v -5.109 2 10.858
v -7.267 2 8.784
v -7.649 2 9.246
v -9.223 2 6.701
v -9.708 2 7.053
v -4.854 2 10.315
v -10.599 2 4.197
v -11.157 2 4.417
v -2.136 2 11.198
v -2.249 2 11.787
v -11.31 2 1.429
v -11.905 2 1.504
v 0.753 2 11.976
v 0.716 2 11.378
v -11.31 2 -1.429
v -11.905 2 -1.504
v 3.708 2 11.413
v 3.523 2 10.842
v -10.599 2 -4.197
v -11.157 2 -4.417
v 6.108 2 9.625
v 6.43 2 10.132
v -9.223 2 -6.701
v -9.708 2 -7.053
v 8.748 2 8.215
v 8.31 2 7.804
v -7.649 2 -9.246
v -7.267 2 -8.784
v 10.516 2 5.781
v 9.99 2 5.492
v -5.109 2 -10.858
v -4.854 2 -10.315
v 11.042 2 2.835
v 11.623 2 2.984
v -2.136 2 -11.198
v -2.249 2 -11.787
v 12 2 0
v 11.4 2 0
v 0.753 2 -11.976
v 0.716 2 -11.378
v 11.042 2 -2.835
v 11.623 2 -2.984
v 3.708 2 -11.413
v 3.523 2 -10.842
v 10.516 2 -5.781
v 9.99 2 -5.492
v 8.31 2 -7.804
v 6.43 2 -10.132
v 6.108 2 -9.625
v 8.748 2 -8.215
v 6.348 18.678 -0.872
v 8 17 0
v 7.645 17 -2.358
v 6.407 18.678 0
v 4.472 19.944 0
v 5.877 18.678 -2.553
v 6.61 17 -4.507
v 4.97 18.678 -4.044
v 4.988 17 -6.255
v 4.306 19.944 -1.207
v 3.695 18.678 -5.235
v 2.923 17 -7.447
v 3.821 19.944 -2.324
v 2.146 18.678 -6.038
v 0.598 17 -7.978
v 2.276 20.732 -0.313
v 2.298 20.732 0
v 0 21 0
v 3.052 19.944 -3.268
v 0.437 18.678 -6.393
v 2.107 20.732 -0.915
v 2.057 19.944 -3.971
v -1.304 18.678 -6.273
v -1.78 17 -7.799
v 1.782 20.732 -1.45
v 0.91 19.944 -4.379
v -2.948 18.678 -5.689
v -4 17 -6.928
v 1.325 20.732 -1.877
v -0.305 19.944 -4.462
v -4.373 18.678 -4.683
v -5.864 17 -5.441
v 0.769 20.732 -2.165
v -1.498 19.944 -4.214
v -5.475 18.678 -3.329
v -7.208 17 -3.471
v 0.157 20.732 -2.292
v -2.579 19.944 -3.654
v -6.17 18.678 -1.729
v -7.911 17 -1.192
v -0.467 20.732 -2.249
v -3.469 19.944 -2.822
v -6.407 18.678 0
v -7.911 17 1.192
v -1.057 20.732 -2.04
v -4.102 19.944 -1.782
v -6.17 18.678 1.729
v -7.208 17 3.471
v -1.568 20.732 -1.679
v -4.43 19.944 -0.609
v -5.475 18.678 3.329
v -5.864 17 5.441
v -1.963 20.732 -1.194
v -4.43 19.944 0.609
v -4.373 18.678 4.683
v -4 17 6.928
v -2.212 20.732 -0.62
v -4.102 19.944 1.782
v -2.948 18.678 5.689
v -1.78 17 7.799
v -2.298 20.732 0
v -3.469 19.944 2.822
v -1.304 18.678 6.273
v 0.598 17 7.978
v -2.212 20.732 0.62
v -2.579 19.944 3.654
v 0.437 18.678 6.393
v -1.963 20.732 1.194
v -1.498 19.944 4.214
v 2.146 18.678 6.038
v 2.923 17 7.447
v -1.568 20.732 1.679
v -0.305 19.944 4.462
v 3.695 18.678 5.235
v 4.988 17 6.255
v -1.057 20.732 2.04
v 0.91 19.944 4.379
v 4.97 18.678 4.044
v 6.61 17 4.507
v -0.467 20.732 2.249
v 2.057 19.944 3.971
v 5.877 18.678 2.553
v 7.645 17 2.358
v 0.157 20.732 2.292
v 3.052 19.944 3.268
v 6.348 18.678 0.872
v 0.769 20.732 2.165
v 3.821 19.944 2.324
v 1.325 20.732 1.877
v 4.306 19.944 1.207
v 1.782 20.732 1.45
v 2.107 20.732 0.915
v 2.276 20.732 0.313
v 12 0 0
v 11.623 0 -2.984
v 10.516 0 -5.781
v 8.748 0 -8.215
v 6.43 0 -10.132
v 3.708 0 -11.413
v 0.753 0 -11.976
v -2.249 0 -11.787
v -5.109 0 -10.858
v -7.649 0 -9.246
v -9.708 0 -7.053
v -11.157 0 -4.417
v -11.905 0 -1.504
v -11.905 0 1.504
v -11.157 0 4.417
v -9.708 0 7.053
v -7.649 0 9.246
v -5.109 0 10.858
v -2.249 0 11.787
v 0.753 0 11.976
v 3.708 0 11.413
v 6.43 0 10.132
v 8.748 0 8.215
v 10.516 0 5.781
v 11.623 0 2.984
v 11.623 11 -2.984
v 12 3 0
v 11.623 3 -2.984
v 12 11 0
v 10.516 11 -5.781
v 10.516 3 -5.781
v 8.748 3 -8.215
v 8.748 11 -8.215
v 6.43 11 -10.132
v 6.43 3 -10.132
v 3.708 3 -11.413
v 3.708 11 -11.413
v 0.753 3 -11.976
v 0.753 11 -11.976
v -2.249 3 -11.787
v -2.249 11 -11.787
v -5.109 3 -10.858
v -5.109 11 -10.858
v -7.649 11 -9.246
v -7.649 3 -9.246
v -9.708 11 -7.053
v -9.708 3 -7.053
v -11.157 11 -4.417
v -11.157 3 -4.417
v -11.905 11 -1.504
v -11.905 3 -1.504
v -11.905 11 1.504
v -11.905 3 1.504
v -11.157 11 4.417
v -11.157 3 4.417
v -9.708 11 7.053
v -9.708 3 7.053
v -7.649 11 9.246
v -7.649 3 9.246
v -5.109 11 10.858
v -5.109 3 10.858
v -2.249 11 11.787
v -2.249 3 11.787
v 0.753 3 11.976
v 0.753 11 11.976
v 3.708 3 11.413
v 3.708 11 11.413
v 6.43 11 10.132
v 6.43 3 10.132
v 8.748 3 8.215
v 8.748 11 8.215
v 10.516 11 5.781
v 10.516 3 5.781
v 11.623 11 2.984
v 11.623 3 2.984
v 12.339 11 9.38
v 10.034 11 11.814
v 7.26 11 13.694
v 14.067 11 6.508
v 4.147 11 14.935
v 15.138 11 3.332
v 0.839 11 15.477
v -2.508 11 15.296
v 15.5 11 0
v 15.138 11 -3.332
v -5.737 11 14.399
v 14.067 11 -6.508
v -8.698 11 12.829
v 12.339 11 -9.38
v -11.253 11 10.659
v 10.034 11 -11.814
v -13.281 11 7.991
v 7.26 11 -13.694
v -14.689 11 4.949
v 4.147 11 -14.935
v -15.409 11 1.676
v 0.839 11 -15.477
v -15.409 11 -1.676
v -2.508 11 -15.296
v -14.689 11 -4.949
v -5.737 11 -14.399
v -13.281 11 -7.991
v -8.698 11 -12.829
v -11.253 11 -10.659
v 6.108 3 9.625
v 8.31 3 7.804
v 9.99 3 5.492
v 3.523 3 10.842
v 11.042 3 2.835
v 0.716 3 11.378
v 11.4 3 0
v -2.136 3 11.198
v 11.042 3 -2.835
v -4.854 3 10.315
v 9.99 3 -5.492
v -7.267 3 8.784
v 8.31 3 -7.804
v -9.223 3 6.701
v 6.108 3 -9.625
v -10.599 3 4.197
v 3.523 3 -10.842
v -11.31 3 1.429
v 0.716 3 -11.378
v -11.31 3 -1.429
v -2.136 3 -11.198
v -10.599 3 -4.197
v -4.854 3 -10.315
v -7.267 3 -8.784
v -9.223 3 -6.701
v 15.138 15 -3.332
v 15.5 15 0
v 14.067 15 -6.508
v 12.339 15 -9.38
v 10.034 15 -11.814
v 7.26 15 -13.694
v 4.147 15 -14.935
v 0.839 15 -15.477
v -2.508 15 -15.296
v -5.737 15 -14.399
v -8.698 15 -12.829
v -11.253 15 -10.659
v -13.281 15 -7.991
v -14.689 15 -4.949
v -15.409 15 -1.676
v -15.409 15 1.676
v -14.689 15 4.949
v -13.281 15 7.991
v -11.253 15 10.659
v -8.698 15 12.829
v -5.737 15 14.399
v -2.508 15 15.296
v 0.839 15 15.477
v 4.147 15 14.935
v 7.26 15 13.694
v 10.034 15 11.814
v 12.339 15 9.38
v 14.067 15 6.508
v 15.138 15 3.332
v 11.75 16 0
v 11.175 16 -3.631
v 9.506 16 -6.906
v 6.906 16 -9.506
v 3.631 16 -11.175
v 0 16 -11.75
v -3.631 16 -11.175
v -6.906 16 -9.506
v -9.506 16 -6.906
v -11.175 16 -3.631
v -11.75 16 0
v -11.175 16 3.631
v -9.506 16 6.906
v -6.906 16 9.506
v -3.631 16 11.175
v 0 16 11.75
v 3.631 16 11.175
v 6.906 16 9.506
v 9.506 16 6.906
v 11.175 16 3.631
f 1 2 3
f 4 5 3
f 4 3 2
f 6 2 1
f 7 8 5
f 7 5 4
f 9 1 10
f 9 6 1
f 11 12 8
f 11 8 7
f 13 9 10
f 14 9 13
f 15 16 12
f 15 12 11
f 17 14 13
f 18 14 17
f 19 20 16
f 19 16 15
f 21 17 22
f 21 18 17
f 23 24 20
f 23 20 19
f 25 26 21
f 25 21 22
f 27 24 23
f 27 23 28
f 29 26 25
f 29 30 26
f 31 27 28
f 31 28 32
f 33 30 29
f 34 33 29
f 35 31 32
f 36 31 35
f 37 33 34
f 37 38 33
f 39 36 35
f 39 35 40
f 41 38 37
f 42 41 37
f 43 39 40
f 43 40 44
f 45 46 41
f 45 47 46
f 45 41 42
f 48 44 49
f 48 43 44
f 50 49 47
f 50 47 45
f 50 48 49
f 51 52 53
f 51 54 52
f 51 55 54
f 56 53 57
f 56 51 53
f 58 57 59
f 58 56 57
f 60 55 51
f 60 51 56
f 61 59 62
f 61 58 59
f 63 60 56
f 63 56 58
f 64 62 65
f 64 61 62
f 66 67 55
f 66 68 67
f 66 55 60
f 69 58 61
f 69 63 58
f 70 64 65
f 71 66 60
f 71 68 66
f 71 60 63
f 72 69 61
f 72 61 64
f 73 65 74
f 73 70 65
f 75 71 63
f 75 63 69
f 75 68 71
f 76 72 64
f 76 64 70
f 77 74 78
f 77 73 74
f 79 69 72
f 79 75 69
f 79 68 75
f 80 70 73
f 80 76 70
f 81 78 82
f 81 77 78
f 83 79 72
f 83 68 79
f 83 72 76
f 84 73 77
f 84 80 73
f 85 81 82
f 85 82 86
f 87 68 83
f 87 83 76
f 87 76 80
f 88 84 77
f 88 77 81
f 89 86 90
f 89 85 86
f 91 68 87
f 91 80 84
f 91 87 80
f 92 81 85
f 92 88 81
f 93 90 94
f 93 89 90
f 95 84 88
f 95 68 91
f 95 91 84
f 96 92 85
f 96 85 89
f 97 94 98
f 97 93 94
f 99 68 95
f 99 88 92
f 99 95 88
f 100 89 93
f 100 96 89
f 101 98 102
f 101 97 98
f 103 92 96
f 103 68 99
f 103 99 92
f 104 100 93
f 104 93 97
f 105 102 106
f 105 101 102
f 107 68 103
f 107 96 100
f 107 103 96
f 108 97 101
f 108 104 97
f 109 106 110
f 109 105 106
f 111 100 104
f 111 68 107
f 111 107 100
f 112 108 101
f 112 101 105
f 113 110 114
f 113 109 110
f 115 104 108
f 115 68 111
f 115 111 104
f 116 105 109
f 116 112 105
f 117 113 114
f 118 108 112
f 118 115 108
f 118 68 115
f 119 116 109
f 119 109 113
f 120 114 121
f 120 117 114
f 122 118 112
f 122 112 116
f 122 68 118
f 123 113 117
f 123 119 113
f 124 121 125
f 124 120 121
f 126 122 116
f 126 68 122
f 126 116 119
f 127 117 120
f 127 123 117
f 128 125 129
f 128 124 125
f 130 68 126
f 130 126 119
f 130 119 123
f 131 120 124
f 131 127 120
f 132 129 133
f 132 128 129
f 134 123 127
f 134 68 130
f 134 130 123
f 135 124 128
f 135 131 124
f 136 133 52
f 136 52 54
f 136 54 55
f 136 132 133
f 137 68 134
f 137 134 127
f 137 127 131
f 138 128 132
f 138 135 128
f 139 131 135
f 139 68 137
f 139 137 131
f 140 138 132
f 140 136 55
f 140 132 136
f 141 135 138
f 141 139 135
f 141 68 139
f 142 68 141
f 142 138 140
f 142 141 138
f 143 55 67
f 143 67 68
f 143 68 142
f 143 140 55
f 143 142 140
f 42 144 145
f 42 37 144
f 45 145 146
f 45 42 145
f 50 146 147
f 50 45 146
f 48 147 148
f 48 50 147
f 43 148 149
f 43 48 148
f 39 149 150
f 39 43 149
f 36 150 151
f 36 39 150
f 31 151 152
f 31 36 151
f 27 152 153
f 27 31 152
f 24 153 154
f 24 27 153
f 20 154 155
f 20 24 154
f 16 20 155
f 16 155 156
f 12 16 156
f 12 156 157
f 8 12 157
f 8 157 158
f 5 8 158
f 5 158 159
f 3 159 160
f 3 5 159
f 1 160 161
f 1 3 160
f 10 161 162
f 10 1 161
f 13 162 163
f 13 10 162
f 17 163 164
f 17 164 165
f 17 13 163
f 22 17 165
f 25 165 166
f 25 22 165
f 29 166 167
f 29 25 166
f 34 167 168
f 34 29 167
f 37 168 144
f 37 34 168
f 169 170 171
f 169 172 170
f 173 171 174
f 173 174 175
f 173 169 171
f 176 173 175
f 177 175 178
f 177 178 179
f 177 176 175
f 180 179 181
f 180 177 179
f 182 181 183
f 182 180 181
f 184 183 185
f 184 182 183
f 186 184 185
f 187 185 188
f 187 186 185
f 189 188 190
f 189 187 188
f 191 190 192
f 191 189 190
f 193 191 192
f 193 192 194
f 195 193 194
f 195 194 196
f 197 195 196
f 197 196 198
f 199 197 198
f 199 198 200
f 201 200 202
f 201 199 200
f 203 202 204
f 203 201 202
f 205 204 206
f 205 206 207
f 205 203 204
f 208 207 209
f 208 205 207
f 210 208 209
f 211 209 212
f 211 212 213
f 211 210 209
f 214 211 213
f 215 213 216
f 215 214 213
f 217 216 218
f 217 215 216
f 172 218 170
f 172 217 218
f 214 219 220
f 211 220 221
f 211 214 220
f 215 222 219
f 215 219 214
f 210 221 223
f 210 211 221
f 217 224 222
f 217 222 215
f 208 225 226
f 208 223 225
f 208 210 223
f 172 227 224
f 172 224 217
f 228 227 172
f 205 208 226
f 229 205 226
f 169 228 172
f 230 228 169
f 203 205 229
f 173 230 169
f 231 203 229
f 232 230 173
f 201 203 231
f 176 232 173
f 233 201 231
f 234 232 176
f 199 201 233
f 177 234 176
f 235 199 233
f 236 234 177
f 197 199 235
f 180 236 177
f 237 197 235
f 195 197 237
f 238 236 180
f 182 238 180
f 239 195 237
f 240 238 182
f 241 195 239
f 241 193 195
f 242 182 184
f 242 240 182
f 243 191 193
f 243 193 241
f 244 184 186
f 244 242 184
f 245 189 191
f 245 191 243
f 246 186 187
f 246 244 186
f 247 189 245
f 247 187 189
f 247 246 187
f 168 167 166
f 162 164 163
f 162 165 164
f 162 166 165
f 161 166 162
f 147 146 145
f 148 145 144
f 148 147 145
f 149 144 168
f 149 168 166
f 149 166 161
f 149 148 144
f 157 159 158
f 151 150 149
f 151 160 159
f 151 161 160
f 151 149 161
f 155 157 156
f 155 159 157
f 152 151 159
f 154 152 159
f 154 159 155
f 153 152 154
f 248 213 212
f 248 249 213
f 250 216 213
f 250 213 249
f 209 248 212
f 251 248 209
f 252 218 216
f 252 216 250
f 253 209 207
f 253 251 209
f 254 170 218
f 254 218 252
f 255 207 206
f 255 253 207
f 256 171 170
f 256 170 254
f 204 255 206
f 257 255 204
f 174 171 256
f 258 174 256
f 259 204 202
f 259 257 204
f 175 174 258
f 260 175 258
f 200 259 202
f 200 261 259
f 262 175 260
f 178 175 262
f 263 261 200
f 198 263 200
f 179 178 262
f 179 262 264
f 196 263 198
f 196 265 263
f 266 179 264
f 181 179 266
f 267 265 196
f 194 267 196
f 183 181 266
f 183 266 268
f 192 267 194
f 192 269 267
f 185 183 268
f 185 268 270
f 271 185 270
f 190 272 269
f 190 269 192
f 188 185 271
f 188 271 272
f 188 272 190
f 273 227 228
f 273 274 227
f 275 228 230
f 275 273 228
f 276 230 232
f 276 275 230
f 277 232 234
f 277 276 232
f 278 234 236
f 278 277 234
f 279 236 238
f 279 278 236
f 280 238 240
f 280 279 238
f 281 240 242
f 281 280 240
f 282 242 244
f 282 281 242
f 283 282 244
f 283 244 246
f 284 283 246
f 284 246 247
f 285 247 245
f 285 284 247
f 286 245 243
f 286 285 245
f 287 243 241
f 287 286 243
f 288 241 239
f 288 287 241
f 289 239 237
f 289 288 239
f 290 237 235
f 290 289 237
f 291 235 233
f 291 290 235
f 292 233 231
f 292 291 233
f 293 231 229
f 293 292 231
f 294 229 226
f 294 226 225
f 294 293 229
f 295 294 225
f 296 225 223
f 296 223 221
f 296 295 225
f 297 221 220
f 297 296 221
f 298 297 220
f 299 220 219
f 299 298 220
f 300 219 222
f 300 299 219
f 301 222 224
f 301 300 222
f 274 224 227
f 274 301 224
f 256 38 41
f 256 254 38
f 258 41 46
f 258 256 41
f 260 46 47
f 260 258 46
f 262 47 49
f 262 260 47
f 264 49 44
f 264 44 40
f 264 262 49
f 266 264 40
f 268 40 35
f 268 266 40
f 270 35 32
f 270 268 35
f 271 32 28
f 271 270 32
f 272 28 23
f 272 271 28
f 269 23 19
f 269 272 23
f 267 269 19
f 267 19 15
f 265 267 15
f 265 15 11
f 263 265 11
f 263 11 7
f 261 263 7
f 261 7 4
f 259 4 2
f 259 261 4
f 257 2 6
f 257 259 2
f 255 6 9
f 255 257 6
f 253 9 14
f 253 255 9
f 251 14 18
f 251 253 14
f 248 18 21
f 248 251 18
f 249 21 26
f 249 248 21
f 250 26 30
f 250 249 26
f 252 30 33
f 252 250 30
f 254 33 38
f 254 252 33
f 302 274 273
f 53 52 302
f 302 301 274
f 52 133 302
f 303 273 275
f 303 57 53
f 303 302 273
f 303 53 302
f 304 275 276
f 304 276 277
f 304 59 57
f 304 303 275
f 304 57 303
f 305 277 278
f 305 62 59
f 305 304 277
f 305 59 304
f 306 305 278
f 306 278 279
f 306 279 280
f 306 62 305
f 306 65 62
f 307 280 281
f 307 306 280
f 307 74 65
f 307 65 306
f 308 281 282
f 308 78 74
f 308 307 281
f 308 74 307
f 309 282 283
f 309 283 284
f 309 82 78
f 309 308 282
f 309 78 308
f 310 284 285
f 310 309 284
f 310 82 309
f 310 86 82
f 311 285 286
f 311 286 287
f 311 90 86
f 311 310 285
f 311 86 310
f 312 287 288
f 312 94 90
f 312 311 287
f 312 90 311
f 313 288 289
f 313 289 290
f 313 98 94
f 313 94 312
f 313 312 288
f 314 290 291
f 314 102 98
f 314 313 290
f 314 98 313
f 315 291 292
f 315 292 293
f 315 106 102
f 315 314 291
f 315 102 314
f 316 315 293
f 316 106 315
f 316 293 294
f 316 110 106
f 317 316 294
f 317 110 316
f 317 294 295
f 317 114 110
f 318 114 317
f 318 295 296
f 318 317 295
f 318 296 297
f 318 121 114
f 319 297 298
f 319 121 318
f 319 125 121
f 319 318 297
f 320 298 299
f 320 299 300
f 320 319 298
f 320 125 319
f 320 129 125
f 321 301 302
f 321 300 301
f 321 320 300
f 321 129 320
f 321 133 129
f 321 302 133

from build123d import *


with BuildPart() as part:
    # Esquisse1 → Révolution1 (revolve)
    with BuildSketch(Plane.XY):
        with BuildLine():
            Line((0, 0), (12, 0))
            Line((12, 0), (12, 2))
            Line((12, 2), (11.4, 2))
            Line((11.4, 2), (11.4, 3))
            Line((11.4, 3), (12, 3))
            Line((12, 3), (12, 11))
            Line((12, 11), (15.5, 11))
            Line((15.5, 11), (15.5, 15))
            Line((15.5, 15), (8, 17))
            ThreePointArc((8, 17), (4.472135955, 19.94427191), (0, 21))
            Line((0, 21), (0, 0))
        make_face()
    revolve(axis=Axis((0, 0, 0), (0, 1, 0)))


solid = part.part
